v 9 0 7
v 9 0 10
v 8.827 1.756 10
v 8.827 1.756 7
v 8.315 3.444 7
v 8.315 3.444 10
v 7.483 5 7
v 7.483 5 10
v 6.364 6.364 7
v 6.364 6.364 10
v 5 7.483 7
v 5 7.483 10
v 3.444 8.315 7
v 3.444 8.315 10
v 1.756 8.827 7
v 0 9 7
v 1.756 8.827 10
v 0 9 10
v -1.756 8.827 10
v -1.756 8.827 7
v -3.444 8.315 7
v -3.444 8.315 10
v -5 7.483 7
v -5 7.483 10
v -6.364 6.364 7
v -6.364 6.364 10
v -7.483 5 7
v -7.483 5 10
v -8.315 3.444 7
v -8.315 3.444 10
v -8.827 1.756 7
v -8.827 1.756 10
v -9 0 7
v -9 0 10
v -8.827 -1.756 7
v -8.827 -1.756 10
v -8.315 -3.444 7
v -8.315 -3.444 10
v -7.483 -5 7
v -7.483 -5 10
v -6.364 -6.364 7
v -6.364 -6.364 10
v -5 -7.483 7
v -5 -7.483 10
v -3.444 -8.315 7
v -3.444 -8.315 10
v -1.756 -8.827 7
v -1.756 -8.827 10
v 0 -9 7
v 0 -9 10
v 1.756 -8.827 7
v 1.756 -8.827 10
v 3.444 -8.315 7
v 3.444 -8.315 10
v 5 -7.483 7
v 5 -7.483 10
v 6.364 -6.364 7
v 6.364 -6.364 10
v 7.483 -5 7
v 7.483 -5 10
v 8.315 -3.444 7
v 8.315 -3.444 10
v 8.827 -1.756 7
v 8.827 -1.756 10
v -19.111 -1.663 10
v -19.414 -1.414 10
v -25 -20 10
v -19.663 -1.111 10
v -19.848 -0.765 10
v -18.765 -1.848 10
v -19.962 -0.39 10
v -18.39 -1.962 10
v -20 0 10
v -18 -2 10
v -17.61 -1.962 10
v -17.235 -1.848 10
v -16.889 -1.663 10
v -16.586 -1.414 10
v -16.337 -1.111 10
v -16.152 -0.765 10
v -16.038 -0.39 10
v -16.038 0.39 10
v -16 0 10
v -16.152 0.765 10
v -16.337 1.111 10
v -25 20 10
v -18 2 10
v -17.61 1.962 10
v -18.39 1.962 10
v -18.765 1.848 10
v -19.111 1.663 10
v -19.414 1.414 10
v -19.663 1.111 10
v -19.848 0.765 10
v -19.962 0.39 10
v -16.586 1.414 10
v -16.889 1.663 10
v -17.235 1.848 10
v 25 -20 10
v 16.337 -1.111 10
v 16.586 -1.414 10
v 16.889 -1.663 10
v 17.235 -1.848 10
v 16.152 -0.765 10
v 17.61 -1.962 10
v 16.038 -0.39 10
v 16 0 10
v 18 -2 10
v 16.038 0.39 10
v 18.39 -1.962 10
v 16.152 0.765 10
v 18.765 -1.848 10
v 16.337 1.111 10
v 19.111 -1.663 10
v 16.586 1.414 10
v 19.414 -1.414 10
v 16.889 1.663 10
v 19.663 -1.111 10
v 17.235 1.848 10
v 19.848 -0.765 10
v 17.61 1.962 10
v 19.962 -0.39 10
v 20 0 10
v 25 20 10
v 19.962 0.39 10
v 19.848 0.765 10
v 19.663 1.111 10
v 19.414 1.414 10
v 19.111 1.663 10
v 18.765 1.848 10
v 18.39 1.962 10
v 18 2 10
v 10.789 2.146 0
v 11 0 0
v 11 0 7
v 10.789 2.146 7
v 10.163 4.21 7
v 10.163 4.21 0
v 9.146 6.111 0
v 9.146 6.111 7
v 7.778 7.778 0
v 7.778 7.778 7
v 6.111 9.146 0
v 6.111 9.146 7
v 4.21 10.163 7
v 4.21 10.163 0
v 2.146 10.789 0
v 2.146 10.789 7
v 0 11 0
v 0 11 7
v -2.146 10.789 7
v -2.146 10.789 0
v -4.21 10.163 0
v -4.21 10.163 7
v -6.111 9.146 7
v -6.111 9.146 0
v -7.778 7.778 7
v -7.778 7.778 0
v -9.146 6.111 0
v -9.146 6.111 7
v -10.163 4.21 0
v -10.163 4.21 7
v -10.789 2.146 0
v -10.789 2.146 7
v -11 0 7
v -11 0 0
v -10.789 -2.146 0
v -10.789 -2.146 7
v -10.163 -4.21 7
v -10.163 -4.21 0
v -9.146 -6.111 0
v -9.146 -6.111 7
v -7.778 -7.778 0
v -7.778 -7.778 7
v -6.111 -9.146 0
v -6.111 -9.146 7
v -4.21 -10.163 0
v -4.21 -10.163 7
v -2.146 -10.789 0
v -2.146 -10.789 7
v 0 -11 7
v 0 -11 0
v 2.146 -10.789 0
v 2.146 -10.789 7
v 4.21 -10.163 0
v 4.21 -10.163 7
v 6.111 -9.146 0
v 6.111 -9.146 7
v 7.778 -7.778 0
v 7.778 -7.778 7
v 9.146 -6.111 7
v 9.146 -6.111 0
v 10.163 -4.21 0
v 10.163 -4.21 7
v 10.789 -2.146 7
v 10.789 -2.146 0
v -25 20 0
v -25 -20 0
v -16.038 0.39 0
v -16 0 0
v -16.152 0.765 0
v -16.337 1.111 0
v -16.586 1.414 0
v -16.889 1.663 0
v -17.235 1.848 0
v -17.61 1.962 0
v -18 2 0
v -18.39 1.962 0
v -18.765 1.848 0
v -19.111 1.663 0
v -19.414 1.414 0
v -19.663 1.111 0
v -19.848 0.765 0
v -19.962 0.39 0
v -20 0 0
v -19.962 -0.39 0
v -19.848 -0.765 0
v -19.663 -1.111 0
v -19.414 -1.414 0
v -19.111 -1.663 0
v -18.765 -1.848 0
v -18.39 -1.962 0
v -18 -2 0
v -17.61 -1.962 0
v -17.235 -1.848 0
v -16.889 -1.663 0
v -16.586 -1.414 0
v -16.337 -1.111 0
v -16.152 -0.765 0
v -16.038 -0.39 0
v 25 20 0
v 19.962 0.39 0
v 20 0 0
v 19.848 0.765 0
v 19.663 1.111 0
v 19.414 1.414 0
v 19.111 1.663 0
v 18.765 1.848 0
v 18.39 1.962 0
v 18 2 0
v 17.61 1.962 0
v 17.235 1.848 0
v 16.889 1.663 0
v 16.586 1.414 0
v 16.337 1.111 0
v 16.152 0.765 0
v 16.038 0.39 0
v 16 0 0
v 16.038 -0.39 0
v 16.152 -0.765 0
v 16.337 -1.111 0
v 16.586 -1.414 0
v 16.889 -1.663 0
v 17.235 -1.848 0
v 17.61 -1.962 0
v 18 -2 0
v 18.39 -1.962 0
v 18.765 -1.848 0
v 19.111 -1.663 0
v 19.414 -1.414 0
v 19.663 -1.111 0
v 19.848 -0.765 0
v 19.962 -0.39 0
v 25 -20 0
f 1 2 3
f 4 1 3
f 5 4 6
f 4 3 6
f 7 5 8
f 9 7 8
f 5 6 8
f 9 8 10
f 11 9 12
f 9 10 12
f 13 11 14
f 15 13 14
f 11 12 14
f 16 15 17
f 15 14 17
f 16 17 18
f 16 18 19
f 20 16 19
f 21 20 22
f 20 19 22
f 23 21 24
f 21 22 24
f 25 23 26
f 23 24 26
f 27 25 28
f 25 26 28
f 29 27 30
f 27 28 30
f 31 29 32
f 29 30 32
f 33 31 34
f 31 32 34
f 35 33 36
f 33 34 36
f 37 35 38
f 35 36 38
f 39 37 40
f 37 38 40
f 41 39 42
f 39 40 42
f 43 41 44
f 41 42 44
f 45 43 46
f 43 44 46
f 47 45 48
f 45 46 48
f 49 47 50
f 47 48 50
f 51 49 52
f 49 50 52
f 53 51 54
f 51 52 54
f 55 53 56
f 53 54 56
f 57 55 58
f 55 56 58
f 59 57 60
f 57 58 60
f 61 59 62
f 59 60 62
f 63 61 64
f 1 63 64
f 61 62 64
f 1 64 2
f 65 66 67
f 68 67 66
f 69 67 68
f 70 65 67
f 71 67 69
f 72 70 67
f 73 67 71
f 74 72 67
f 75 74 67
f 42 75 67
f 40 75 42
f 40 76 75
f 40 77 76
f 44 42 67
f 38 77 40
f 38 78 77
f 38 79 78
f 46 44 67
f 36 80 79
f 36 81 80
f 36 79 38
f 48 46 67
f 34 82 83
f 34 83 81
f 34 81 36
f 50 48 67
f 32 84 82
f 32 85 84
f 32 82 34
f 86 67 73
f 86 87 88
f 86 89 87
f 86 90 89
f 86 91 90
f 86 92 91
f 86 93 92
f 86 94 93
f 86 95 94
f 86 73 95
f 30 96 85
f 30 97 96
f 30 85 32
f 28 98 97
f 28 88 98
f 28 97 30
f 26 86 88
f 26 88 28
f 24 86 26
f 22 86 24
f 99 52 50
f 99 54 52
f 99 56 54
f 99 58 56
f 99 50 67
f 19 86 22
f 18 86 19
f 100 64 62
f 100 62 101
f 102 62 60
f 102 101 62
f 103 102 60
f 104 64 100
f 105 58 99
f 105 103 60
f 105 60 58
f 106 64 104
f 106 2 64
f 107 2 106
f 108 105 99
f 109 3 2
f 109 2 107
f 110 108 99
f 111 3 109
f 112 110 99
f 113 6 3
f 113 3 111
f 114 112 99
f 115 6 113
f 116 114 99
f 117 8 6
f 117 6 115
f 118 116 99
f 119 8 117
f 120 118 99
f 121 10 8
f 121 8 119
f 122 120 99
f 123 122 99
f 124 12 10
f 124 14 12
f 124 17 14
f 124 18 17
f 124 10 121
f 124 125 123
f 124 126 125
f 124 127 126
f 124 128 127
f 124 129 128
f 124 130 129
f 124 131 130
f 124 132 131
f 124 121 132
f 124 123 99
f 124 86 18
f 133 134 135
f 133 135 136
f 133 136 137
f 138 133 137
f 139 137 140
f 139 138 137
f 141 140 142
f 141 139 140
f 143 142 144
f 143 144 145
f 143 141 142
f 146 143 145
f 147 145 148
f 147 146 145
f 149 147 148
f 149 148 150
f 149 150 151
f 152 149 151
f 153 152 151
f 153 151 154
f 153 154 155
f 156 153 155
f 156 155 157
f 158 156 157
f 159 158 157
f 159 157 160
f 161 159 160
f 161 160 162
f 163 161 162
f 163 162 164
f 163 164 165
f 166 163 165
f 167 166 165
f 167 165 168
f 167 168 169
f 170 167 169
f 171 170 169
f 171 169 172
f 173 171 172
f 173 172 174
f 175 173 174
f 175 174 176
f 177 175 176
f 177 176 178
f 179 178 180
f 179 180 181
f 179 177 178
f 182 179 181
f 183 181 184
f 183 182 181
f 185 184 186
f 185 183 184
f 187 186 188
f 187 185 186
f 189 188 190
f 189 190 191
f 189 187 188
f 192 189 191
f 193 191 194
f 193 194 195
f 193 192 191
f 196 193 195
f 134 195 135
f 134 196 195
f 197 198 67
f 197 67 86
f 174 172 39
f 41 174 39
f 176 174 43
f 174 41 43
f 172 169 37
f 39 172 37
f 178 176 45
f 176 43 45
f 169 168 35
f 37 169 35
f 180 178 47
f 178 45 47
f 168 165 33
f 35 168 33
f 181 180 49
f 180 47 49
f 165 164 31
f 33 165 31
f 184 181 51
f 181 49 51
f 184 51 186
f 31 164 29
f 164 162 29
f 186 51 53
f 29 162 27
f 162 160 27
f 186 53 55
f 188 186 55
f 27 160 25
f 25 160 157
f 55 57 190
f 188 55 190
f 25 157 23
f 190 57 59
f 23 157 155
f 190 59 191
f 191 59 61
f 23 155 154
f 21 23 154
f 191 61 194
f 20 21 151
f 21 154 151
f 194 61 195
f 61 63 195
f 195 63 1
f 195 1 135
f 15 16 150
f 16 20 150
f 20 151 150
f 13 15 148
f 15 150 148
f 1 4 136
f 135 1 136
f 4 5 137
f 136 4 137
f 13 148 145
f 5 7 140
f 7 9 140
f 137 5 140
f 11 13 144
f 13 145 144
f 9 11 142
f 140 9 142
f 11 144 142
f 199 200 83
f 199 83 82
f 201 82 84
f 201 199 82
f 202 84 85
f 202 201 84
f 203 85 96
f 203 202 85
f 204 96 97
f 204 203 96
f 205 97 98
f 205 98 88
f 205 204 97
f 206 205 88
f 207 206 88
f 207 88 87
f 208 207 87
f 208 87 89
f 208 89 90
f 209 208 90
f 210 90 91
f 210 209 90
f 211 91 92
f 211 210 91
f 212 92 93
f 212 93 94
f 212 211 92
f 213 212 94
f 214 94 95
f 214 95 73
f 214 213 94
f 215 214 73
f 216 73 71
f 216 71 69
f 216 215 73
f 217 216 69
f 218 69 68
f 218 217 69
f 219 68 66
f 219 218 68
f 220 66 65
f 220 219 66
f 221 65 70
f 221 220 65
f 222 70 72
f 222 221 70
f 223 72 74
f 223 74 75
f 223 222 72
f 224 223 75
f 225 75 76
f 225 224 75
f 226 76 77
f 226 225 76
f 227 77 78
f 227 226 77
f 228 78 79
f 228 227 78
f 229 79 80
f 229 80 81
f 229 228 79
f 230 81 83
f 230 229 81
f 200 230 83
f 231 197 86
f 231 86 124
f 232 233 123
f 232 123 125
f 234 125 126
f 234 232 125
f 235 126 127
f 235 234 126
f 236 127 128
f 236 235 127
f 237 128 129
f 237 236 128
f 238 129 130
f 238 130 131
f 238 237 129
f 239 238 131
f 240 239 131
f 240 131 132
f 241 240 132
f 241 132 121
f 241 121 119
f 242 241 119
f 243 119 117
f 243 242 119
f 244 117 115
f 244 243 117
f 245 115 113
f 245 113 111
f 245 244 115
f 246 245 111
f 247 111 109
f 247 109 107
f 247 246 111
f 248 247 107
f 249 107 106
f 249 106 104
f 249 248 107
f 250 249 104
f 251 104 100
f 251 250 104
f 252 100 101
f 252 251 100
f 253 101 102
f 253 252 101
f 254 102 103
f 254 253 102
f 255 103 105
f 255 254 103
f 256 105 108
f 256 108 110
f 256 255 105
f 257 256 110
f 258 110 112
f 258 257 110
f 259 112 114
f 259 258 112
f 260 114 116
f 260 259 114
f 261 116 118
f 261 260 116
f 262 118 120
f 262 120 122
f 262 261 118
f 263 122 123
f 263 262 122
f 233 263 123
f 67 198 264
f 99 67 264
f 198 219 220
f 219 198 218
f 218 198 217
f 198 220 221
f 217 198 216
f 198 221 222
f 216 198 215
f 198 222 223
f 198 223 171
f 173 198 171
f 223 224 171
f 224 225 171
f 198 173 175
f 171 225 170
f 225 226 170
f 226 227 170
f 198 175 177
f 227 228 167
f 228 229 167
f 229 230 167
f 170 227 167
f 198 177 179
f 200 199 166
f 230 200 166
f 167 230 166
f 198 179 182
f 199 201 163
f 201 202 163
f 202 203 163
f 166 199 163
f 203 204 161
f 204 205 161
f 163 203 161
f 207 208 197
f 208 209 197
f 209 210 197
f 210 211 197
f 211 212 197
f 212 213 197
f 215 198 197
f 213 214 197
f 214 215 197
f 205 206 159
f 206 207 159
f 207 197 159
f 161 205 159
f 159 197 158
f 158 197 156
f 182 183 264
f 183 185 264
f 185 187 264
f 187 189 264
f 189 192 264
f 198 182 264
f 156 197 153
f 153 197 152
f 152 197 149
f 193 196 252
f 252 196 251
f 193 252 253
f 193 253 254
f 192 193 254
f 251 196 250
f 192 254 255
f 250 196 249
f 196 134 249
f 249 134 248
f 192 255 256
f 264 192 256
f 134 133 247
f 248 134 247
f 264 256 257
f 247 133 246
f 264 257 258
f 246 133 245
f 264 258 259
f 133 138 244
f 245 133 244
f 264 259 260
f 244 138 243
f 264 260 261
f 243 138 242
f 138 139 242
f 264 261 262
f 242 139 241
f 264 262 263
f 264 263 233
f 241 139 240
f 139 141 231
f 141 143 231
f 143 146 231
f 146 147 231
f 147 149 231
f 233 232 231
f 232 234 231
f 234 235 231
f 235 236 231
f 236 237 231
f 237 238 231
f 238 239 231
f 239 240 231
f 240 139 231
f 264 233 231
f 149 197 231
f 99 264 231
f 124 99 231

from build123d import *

# Parameters (mm, degrees)
SKETCH1_W           = 50
SKETCH1_H           = 40
SKETCH1_R           = 11
SKETCH1_R_2         = 2
BOSS_EXTRUDE1_DEPTH = 10
SKETCH2_R           = 11
SKETCH2_R_2         = 9
BOSS_EXTRUDE2_DEPTH = 3


with BuildPart() as part:
    # Sketch1 → Boss-Extrude1 (new body)
    with BuildSketch(Plane.XY):
        Rectangle(SKETCH1_W, SKETCH1_H)
        Circle(SKETCH1_R, mode=Mode.SUBTRACT)
        with Locations((-18, 0)):
            Circle(SKETCH1_R_2, mode=Mode.SUBTRACT)
        with Locations((18, 0)):
            Circle(SKETCH1_R_2, mode=Mode.SUBTRACT)
    extrude(amount=BOSS_EXTRUDE1_DEPTH)

    # Sketch2 → Boss-Extrude2 (add)
    with BuildSketch(Plane.XY.offset(10)):
        Circle(SKETCH2_R)
        Circle(SKETCH2_R_2, mode=Mode.SUBTRACT)
    extrude(amount=-BOSS_EXTRUDE2_DEPTH)


solid = part.part
